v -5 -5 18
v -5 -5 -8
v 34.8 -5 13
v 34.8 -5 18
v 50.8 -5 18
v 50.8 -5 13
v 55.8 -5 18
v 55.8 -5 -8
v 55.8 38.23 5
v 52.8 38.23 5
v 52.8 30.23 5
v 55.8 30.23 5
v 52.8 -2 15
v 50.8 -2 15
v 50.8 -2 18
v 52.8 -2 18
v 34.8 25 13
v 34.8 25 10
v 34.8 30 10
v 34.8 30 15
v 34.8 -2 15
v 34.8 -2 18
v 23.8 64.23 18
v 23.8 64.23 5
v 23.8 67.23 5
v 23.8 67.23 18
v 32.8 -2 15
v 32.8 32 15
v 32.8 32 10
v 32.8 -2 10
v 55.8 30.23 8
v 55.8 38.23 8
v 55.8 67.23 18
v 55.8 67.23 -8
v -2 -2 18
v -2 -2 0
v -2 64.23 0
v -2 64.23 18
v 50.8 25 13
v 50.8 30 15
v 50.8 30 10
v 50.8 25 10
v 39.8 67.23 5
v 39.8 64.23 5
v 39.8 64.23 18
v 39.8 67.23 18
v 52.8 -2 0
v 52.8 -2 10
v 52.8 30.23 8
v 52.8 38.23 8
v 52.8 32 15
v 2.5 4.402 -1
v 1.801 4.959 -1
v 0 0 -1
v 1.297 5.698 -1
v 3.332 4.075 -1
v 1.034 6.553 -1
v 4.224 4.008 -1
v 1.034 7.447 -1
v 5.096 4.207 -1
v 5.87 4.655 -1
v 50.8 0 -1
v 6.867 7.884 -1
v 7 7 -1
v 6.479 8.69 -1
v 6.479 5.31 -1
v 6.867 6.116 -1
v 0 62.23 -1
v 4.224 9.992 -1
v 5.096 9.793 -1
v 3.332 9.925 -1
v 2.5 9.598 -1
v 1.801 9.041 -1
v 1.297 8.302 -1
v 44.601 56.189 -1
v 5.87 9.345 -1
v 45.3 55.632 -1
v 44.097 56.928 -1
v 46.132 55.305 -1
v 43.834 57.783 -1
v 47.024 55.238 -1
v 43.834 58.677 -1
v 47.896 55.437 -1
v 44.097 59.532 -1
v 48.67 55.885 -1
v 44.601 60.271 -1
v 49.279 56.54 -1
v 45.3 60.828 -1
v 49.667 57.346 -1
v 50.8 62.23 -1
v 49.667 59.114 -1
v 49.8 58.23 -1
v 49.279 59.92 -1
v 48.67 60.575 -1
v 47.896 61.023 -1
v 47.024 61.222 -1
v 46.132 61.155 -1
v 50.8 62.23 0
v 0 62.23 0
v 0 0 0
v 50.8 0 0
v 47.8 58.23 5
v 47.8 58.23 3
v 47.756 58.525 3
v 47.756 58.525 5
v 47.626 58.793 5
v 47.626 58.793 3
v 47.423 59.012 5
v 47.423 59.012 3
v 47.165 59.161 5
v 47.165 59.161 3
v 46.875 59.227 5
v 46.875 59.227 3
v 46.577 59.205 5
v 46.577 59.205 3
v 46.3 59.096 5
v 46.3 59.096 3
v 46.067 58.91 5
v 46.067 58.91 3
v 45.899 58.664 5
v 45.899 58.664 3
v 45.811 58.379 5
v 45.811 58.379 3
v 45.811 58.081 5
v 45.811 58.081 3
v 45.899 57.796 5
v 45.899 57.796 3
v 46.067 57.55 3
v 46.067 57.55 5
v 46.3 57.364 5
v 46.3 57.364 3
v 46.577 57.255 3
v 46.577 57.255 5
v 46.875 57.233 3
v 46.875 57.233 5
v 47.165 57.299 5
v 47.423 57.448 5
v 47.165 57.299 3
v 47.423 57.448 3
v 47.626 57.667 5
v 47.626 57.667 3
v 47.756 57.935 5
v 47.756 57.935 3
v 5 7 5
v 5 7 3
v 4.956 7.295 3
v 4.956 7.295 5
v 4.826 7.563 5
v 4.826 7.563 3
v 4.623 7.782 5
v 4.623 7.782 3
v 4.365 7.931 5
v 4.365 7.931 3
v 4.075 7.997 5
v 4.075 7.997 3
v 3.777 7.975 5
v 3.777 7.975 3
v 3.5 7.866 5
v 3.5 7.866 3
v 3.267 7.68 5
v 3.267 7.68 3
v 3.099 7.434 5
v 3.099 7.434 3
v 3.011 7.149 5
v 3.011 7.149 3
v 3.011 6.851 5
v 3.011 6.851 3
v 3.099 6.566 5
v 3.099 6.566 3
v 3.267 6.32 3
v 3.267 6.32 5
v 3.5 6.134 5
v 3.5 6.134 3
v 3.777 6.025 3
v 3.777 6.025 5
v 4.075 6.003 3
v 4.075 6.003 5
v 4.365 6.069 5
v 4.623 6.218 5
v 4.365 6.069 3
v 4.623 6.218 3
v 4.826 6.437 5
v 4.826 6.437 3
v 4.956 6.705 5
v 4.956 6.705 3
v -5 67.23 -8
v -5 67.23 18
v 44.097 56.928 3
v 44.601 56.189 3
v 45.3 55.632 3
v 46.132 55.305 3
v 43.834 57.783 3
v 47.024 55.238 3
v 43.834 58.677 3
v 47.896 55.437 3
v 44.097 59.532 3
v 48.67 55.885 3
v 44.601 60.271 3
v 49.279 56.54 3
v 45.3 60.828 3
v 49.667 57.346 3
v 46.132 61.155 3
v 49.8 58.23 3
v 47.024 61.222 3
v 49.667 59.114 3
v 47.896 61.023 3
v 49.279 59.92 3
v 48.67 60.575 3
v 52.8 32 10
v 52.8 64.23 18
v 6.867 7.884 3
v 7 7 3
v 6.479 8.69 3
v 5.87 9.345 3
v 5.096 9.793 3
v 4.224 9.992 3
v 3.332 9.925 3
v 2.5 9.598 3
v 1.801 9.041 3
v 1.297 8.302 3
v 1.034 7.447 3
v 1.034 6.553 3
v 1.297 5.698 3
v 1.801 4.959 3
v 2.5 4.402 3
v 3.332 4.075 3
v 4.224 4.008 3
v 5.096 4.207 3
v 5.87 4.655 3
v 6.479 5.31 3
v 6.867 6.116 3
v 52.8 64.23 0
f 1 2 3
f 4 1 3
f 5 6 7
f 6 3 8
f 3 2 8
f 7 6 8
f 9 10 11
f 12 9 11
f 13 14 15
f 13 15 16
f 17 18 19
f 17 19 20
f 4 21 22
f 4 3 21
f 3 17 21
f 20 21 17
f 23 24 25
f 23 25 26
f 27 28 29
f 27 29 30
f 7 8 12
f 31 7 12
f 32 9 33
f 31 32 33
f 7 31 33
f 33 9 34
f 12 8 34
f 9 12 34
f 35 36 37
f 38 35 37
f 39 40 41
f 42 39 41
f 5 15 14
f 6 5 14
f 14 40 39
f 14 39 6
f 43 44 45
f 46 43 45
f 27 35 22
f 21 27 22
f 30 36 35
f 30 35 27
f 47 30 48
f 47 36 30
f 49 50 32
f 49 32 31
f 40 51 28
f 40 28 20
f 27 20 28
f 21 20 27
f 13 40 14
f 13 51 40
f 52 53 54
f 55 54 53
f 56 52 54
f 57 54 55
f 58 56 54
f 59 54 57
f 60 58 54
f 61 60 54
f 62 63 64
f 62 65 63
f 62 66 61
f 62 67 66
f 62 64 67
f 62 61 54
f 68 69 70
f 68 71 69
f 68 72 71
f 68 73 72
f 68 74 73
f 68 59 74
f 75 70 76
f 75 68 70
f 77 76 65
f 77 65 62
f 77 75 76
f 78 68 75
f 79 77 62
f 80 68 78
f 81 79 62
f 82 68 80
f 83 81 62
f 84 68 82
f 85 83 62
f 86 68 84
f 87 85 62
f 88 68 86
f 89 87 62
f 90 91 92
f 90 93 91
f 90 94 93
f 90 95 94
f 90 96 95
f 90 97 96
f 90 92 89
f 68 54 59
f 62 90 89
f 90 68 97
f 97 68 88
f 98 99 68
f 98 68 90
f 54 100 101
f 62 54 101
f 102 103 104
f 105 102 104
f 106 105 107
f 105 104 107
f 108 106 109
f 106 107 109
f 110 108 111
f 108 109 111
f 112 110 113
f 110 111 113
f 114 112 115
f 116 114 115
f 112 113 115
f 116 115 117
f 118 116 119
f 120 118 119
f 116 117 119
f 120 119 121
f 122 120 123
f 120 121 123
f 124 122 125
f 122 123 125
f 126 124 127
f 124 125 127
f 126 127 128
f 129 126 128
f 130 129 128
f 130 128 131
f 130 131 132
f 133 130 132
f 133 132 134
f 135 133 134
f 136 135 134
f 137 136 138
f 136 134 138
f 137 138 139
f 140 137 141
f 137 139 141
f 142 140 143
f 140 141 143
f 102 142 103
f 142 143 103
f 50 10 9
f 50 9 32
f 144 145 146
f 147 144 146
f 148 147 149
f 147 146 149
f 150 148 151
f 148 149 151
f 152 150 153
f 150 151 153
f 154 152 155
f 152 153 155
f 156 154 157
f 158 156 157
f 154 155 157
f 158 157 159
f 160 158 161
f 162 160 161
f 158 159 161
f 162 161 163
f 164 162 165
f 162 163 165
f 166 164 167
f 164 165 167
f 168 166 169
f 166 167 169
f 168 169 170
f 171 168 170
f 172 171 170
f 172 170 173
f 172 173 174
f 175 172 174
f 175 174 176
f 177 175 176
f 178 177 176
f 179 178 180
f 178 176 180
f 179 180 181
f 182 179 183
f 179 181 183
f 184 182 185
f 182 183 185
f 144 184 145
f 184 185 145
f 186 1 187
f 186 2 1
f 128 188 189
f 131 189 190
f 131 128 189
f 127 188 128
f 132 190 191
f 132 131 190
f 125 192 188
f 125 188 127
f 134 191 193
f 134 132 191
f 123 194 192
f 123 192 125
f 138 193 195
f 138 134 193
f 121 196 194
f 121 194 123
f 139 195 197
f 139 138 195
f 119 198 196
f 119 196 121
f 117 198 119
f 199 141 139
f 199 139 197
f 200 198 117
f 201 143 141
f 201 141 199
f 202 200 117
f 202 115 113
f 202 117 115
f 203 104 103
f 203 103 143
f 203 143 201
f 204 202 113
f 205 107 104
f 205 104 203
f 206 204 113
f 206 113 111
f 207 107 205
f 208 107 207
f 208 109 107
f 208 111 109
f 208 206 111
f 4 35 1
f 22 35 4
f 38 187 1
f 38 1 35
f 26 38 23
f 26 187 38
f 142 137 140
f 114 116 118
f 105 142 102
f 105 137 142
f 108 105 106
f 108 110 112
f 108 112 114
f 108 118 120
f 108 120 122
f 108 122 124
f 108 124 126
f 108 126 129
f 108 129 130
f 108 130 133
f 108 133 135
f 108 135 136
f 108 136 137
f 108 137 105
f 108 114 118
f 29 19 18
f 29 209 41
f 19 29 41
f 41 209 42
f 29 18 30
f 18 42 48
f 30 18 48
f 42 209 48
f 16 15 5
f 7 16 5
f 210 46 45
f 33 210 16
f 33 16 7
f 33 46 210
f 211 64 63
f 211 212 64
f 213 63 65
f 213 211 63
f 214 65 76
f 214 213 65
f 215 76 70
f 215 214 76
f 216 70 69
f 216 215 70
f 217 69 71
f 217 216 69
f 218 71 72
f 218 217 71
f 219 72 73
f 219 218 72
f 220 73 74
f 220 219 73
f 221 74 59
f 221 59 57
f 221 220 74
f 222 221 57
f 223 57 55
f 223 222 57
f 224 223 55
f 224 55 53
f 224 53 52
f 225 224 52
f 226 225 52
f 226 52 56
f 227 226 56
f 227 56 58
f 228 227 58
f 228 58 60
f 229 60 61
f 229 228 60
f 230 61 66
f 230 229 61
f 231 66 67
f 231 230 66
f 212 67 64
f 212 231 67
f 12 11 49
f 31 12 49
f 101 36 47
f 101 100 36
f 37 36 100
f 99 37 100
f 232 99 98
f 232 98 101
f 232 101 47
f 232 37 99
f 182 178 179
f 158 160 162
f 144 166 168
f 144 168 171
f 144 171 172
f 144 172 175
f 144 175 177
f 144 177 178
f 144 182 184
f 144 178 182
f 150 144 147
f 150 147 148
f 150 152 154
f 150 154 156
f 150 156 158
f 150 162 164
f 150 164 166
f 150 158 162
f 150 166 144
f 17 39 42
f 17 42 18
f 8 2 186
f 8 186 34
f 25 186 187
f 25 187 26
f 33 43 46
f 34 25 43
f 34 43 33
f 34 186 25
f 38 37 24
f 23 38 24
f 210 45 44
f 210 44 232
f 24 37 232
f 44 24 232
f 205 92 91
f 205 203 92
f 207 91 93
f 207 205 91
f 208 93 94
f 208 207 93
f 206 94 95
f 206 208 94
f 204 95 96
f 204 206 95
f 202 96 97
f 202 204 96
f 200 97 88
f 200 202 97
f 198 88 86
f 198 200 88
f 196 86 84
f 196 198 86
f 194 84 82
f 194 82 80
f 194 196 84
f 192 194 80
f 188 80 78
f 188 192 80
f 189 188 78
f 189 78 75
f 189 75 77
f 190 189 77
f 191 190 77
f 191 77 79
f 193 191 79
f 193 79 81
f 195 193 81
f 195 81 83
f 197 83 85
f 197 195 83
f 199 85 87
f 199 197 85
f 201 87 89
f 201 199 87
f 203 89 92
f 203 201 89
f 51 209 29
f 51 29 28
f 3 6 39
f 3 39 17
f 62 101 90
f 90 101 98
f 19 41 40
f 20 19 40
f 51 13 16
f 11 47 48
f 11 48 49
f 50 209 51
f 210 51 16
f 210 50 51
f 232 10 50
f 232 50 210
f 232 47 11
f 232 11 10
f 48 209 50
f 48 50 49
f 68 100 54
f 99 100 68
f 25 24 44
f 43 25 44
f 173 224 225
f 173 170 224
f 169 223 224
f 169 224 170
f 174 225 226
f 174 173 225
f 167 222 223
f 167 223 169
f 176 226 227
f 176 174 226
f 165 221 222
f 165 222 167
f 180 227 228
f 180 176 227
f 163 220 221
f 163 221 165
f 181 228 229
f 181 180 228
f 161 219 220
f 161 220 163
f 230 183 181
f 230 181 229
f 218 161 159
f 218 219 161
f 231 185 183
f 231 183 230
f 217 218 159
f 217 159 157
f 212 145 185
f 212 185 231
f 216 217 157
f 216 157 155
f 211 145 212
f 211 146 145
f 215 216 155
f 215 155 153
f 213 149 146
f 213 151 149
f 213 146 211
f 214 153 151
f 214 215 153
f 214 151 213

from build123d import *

# Parameters (mm, degrees)
SKETCH_W        = 60.8
SKETCH_H        = 72.23
PAD_DEPTH       = 8
SKETCH001_R     = 3
PAD001_DEPTH    = 3
SKETCH002_W     = 50.8
SKETCH002_H     = 62.23
SKETCH002_R     = 3
POCKET_DEPTH    = 1
SKETCH003_W     = 60.8
SKETCH003_H     = 72.23
SKETCH003_W_2   = 54.8
SKETCH003_H_2   = 66.23
PAD002_DEPTH    = 18
SKETCH004_W     = 16
SKETCH004_H     = 13
POCKET001_DEPTH = 3.001
SKETCH005_W     = 8
SKETCH005_H     = 3
POCKET002_DEPTH = 3.001
SKETCH006_W     = 16
SKETCH006_H     = 5
POCKET003_DEPTH = 3
PAD003_DEPTH    = 32
SKETCH008_W     = 16
SKETCH008_H     = 3
POCKET004_DEPTH = 5
SKETCH009_W     = 2
SKETCH009_H     = 5
PAD004_DEPTH    = 20
SKETCH010_R     = 1
PAD005_DEPTH    = 2


with BuildPart() as part:
    # Sketch → Pad (new body)
    with BuildSketch(Plane.XY):
        with Locations((25.4, 31.115)):
            Rectangle(SKETCH_W, SKETCH_H)
    extrude(amount=-PAD_DEPTH)

    # Sketch001 (on Face5 of Pad) → Pad001 (join)
    with BuildSketch(Plane.XY):
        with Locations((46.8, 58.23)):
            Circle(SKETCH001_R)
        with Locations((4, 7)):
            Circle(SKETCH001_R)
    extrude(amount=PAD001_DEPTH)

    # Sketch002 (on Face4 of Pad001) → Pocket (cut)
    with BuildSketch(Plane.XY):
        with Locations((25.4, 31.115)):
            Rectangle(SKETCH002_W, SKETCH002_H)
        with Locations((46.8, 58.23)):
            Circle(SKETCH002_R, mode=Mode.SUBTRACT)
        with Locations((4, 7)):
            Circle(SKETCH002_R, mode=Mode.SUBTRACT)
    extrude(amount=-POCKET_DEPTH, mode=Mode.SUBTRACT)

    # Sketch003 (on Face4 of Pocket) → Pad002 (join)
    with BuildSketch(Plane.XY):
        with Locations((25.4, 31.115)):
            Rectangle(SKETCH003_W, SKETCH003_H)
        with Locations((25.4, 31.115)):
            Rectangle(SKETCH003_W_2, SKETCH003_H_2, mode=Mode.SUBTRACT)
    extrude(amount=PAD002_DEPTH)

    # Sketch004 (on Face11 of Pad002) → Pocket001 (cut, through all)
    with BuildSketch(Plane.XZ.offset(-64.23)):
        with Locations((31.8, 11.5)):
            Rectangle(SKETCH004_W, SKETCH004_H)
    extrude(amount=-POCKET001_DEPTH, mode=Mode.SUBTRACT)

    # Sketch005 (on Face17 of Pocket001) → Pocket002 (cut, through all)
    with BuildSketch(Plane(origin=(52.8, 0, 0), x_dir=(0, -1, 0), z_dir=(-1, 0, 0))):
        with Locations((-34.23, 6.5)):
            Rectangle(SKETCH005_W, SKETCH005_H)
    extrude(amount=-POCKET002_DEPTH, mode=Mode.SUBTRACT)

    # Sketch006 (on Face13 of Pocket002) → Pocket003 (cut)
    with BuildSketch(Plane.XZ.offset(5)):
        with Locations((42.8, 15.5)):
            Rectangle(SKETCH006_W, SKETCH006_H)
    extrude(amount=-POCKET003_DEPTH, mode=Mode.SUBTRACT)

    # Sketch007 (on Face21 of Pocket003) → Pad003 (join)
    with BuildSketch(Plane(origin=(0, -2, 0), x_dir=(-1, 0, 0), z_dir=(0, 1, 0))):
        Polygon((-50.8, 13), (-34.8, 13), (-34.8, 15), (-32.8, 15), (-32.8, 10), (-52.8, 10), (-52.8, 15), (-50.8, 15), align=None)
    extrude(amount=PAD003_DEPTH)

    # Sketch008 (on Face34 of Pad003) → Pocket004 (cut)
    with BuildSketch(Plane(origin=(0, 30, 0), x_dir=(-1, 0, 0), z_dir=(0, 1, 0))):
        with Locations((-42.8, 11.5)):
            Rectangle(SKETCH008_W, SKETCH008_H)
    extrude(amount=-POCKET004_DEPTH, mode=Mode.SUBTRACT)

    # Sketch009 (on Face25 of Pocket004) → Pad004 (join)
    with BuildSketch(Plane(origin=(52.8, 0, 0), x_dir=(0, -1, 0), z_dir=(-1, 0, 0))):
        with Locations((-31, 12.5)):
            Rectangle(SKETCH009_W, SKETCH009_H)
    extrude(amount=PAD004_DEPTH)

    # Sketch010 (on Face53 of Pad004) → Pad005 (join)
    with BuildSketch(Plane.XY.offset(3)):
        with Locations((46.8, 58.23)):
            Circle(SKETCH010_R)
        with Locations((4, 7)):
            Circle(SKETCH010_R)
    extrude(amount=PAD005_DEPTH)


solid = part.part
